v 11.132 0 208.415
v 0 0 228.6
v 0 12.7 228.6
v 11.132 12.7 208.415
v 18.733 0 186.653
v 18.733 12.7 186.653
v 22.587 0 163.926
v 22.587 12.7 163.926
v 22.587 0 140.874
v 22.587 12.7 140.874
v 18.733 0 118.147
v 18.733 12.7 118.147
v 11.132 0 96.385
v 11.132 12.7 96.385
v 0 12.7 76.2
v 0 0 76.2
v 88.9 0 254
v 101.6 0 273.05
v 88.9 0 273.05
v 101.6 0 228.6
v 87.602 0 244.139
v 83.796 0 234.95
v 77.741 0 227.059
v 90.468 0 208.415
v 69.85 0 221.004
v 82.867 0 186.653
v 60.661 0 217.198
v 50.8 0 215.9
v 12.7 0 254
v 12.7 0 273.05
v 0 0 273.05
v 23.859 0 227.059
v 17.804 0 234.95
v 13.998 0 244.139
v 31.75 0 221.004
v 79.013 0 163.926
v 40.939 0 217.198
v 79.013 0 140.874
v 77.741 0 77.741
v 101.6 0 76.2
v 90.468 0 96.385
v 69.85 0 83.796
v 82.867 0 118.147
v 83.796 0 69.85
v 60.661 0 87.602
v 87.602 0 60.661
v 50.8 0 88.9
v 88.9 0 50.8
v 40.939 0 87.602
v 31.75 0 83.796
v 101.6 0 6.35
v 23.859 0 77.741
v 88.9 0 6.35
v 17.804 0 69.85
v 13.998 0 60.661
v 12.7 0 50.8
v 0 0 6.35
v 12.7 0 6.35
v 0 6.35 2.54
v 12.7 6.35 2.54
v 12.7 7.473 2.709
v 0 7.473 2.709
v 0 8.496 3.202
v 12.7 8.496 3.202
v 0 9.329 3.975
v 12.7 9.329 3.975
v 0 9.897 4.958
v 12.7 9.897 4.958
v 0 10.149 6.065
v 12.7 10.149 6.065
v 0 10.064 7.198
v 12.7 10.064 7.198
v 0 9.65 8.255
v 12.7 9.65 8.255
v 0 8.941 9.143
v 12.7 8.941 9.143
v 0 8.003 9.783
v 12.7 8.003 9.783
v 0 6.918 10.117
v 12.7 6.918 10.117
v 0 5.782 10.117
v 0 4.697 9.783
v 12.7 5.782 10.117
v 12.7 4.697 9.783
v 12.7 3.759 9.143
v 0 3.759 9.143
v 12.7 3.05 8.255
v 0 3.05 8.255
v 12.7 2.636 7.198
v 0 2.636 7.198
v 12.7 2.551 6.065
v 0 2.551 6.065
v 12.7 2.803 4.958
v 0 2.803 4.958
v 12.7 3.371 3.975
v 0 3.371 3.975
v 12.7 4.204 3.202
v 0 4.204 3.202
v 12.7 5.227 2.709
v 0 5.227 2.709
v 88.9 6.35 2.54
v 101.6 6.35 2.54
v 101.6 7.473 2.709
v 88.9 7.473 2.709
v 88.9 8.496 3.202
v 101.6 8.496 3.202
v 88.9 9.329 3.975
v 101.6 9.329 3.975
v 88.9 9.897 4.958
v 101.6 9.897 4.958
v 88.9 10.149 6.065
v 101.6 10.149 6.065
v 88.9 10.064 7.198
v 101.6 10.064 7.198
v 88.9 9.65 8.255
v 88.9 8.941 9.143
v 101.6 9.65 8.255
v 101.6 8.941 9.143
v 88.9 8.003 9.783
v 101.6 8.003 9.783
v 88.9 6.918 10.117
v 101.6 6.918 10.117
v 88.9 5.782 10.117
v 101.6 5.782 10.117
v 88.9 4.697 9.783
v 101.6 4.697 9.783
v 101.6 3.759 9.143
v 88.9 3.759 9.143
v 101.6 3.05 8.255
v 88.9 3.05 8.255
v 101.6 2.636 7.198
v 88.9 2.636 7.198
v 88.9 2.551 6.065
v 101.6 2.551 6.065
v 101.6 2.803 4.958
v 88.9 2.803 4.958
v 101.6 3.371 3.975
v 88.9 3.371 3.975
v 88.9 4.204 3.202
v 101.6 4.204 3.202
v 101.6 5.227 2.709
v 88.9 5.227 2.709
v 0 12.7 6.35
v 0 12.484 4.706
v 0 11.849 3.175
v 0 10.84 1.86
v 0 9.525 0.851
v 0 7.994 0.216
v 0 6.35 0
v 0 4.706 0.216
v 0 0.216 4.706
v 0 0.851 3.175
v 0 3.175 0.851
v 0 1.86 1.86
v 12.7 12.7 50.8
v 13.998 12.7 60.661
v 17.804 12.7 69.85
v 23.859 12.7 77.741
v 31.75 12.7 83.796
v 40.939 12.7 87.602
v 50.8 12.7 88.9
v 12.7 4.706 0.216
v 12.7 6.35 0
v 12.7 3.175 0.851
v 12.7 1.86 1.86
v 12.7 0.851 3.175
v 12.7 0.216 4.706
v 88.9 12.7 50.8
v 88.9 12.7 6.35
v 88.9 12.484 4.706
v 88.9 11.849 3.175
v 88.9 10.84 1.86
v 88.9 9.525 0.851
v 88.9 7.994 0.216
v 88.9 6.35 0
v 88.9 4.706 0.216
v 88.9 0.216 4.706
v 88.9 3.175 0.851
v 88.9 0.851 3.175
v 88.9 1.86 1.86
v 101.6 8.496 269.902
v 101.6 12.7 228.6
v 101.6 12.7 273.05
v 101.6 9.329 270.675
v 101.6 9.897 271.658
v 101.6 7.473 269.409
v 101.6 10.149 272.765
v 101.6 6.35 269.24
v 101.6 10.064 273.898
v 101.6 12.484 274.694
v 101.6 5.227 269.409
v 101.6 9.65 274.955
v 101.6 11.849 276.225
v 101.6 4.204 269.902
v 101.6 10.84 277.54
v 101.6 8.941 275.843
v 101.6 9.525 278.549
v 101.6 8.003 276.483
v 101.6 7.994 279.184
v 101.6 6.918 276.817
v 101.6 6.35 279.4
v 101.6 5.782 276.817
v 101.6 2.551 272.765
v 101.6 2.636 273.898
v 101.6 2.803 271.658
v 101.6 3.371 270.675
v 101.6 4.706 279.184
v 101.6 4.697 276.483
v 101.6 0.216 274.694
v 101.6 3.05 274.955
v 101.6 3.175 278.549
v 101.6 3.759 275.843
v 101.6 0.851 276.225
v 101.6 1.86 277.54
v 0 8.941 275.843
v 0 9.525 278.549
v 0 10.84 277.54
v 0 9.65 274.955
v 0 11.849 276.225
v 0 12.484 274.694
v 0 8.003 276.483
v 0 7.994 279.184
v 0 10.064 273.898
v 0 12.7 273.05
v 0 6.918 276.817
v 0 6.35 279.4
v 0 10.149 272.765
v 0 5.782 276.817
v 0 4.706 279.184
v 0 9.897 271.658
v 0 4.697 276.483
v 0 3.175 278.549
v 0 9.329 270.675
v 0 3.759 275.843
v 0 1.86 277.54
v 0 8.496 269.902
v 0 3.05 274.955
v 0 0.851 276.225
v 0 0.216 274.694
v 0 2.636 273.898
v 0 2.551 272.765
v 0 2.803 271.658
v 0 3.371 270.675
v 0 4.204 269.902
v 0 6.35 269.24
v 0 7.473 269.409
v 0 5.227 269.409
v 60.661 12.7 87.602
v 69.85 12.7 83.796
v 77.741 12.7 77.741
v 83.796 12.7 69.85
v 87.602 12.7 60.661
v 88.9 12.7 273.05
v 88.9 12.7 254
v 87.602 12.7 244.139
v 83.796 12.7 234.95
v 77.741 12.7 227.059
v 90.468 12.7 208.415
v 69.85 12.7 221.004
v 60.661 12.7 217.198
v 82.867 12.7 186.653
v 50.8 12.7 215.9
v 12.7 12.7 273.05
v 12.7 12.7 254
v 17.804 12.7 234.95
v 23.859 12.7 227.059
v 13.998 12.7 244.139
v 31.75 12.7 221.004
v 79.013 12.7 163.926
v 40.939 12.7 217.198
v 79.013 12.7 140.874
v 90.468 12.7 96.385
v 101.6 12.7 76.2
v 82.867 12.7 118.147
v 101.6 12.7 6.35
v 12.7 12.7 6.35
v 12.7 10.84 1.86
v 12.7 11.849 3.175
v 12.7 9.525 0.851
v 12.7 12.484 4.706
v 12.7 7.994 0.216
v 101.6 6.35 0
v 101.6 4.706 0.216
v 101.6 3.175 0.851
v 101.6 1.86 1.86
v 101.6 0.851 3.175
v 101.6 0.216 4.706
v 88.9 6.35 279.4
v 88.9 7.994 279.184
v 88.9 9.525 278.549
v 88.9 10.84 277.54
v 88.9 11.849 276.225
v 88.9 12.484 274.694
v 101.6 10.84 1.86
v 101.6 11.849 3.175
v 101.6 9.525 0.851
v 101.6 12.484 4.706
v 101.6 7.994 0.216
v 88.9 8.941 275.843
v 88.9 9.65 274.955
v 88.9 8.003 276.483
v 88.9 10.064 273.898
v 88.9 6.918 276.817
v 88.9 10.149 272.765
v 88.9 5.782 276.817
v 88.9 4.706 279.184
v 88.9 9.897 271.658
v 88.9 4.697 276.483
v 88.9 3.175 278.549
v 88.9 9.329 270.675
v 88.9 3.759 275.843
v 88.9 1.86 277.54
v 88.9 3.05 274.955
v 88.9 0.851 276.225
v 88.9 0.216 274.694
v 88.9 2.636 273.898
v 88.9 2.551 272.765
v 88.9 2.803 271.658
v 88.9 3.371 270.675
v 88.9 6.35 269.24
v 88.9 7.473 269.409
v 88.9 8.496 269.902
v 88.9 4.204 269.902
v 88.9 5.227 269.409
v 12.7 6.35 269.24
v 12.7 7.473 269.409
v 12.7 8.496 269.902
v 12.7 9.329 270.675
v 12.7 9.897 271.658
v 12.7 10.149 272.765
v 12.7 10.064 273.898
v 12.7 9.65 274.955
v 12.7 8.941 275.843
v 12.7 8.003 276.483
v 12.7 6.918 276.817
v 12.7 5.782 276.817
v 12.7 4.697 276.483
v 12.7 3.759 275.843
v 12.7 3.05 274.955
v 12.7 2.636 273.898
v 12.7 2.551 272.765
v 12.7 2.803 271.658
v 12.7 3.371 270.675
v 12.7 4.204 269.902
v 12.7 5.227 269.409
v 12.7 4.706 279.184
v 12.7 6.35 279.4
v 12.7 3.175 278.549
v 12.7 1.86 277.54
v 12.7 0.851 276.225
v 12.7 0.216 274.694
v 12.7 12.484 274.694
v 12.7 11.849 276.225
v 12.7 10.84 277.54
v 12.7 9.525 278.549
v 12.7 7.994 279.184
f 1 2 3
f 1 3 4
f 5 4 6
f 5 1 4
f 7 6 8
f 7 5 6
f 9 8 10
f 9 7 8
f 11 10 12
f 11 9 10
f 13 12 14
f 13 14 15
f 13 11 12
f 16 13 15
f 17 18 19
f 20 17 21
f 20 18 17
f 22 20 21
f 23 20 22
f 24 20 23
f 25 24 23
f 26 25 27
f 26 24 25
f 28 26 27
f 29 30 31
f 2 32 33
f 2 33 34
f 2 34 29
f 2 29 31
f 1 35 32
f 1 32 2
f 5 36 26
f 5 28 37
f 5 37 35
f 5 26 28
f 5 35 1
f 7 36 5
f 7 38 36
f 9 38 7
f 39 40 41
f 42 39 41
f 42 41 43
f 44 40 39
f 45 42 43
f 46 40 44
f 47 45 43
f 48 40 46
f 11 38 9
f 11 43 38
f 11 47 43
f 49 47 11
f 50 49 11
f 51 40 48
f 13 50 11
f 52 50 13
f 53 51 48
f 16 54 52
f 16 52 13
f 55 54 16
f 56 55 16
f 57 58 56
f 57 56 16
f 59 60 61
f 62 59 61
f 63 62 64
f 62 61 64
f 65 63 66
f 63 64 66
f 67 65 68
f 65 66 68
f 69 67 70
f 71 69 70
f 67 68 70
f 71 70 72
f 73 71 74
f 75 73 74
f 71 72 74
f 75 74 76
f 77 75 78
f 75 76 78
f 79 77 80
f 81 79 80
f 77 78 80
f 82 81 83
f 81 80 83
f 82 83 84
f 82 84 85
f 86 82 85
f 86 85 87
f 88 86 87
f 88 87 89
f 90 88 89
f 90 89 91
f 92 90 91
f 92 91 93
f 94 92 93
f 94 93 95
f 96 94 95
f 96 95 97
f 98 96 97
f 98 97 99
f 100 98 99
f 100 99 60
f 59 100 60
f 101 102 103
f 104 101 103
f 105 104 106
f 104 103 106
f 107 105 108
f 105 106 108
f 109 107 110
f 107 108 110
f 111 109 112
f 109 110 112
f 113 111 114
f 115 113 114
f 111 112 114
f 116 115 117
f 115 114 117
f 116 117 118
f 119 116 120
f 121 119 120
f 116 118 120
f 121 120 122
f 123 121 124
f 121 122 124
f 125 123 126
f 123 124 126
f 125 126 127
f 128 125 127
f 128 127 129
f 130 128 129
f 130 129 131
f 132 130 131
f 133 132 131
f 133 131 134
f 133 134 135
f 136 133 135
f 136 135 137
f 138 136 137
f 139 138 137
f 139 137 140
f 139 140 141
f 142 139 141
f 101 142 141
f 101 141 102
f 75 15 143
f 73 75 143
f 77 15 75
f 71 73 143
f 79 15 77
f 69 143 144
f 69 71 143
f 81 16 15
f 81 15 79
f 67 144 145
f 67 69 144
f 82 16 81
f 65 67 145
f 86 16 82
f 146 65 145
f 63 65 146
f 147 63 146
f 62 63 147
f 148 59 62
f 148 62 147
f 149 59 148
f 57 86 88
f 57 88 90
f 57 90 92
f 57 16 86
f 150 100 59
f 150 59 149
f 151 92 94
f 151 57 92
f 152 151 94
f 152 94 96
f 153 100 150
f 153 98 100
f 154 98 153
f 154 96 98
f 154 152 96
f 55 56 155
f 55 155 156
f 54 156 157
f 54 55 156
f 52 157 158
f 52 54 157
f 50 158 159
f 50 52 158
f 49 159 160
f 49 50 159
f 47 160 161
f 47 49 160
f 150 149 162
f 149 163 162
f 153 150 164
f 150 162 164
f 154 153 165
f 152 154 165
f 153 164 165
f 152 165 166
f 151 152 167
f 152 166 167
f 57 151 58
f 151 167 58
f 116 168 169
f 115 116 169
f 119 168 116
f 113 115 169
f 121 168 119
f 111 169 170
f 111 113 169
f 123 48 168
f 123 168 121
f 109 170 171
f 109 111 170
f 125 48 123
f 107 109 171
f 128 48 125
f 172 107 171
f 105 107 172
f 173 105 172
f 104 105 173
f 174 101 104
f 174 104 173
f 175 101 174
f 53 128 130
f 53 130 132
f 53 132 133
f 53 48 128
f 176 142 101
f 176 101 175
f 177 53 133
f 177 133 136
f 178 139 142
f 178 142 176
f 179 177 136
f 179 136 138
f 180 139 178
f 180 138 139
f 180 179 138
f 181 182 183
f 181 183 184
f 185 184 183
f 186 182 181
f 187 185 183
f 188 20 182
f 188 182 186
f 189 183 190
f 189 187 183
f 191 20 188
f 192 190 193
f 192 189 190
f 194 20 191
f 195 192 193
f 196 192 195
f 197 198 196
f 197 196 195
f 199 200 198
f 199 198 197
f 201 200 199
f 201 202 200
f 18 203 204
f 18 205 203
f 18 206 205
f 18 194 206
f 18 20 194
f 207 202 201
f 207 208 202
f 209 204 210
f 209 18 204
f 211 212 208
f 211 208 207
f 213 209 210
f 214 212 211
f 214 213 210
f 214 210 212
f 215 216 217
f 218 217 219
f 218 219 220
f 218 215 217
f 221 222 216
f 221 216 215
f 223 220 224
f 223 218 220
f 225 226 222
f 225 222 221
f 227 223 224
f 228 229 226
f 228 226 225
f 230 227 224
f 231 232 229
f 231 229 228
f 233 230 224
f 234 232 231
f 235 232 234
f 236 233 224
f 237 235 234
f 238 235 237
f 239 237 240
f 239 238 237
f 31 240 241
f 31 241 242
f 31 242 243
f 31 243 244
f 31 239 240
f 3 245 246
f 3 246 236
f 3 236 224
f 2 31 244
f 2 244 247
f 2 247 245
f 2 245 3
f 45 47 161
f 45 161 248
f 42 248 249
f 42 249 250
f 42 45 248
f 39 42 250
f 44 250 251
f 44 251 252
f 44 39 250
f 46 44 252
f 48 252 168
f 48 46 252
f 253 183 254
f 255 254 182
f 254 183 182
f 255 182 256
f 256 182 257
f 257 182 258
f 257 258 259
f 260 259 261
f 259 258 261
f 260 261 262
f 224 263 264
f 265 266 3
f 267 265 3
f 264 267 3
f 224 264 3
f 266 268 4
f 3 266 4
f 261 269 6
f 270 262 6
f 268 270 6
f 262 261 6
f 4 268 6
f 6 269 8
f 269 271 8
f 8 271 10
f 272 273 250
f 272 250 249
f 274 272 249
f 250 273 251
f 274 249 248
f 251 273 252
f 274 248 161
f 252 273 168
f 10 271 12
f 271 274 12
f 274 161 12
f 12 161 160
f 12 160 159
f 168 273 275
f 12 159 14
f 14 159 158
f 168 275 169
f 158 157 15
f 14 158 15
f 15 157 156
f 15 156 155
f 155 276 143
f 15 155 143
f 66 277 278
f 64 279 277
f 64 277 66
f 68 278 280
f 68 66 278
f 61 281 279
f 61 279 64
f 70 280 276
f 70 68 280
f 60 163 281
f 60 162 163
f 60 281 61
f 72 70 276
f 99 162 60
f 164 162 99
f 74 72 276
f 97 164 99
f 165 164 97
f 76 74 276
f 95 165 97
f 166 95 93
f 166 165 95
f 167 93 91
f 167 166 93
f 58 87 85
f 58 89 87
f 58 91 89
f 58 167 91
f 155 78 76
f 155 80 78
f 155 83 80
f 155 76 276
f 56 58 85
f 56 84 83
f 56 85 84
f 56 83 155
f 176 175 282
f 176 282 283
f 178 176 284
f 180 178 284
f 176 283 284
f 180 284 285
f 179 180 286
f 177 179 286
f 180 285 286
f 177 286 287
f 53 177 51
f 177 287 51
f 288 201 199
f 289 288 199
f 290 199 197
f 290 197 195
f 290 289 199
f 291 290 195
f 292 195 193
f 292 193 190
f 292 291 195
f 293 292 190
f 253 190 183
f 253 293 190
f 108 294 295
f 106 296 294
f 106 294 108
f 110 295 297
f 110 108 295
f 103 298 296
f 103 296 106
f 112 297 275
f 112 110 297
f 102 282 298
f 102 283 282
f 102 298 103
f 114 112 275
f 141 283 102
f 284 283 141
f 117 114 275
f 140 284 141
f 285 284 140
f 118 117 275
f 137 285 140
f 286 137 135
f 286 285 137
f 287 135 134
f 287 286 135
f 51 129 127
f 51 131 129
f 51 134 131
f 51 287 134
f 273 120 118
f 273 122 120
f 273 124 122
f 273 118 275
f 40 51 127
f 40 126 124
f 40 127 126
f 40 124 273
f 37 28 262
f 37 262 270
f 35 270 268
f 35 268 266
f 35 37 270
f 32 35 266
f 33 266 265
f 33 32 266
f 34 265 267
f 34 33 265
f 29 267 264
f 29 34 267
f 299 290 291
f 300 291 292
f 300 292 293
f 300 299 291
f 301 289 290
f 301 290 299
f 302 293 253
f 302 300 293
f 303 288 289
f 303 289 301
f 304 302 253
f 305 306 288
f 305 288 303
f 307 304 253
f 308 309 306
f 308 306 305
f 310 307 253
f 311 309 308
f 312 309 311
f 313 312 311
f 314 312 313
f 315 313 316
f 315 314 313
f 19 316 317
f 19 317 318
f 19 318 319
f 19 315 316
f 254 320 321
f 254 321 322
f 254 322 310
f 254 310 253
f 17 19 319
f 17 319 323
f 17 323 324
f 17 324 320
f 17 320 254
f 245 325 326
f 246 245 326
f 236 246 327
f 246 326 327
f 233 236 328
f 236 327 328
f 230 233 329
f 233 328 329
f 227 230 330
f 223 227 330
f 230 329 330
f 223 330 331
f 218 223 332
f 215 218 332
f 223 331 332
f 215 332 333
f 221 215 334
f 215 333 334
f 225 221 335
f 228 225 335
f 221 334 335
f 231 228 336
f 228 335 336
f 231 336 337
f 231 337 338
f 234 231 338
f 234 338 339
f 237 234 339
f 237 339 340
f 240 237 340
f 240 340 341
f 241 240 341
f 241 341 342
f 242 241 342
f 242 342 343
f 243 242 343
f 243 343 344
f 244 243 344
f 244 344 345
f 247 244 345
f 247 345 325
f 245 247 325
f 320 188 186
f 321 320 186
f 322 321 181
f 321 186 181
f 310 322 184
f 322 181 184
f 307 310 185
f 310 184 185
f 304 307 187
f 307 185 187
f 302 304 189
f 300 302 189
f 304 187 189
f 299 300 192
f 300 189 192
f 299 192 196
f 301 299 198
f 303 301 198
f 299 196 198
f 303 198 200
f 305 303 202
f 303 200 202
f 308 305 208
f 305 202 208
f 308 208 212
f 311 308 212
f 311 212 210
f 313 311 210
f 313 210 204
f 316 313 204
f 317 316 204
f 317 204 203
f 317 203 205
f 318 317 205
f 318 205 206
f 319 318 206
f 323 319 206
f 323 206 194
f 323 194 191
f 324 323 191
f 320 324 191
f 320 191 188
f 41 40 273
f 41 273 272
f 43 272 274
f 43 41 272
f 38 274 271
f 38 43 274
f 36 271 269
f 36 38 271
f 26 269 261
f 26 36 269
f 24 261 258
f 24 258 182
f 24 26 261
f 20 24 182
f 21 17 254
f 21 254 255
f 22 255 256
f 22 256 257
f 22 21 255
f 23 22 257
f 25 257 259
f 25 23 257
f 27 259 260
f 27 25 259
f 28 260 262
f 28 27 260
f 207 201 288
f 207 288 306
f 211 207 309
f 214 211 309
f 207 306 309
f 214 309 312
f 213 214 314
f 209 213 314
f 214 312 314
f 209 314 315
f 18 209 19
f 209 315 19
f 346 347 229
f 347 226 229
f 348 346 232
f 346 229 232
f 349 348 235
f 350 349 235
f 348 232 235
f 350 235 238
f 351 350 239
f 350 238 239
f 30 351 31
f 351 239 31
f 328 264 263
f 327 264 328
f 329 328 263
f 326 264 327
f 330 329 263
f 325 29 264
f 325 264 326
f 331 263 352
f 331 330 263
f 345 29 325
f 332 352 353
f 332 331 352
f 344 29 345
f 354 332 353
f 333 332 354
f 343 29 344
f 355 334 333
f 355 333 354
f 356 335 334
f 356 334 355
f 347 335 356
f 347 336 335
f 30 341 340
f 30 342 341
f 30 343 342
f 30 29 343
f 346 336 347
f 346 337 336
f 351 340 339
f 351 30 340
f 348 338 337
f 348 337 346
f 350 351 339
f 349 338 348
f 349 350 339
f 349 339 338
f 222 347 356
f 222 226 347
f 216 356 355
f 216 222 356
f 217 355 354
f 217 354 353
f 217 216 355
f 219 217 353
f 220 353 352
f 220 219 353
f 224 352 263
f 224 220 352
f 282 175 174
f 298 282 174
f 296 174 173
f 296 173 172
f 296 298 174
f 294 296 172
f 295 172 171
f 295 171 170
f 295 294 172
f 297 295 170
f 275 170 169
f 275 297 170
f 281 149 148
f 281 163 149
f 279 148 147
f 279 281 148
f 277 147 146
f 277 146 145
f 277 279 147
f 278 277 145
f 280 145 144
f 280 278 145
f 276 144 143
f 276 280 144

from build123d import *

# Parameters (mm, degrees)
BOSS_EXTRUDE1_DEPTH = 12.7
FILLET1_R           = 6.35
SKETCH2_R           = 3.81
CUT_EXTRUDE1_DEPTH  = 298.570512652
SKETCH3_R           = 3.81
CUT_EXTRUDE2_DEPTH  = 298.570512652


with BuildPart() as part:
    # Sketch1 → Boss-Extrude1 (new body)
    with BuildSketch(Plane(origin=(0, 0, 0), x_dir=(1, 0, 0), z_dir=(0, 1, 0))):
        with BuildLine():
            Line((0, 0), (12.7, 0))
            Line((12.7, 0), (12.7, -50.8))
            ThreePointArc((12.7, -50.8), (23.859231637, -77.740768363), (50.8, -88.9))
            ThreePointArc((50.8, -88.9), (77.740768363, -77.740768363), (88.9, -50.8))
            Line((88.9, -50.8), (88.9, 0))
            Line((88.9, 0), (101.6, 0))
            Line((101.6, 0), (101.6, -76.2))
            ThreePointArc((101.6, -76.2), (78.528496405, -152.4), (101.6, -228.6))
            Line((101.6, -228.6), (101.6, -279.4))
            Line((101.6, -279.4), (88.9, -279.4))
            Line((88.9, -279.4), (88.9, -254))
            ThreePointArc((88.9, -254), (77.740768363, -227.059231637), (50.8, -215.9))
            ThreePointArc((50.8, -215.9), (23.859231637, -227.059231637), (12.7, -254))
            Line((12.7, -254), (12.7, -279.4))
            Line((12.7, -279.4), (0, -279.4))
            Line((0, -279.4), (0, -228.6))
            ThreePointArc((0, -228.6), (23.071503595, -152.4), (0, -76.2))
            Line((0, -76.2), (0, 0))
        make_face()
    extrude(amount=BOSS_EXTRUDE1_DEPTH)

    # Fillet1
    fillet1_edges = [part.edges().sort_by_distance(p)[0] for p in [
        (95.25, 0, 0),
        (6.35, 0, 0),
        (95.25, 12.7, 0),
        (6.35, 12.7, 0),
        (6.35, 0, 279.4),
        (6.35, 12.7, 279.4),
        (95.25, 0, 279.4),
        (95.25, 12.7, 279.4),
    ]]
    fillet(fillet1_edges, radius=FILLET1_R - 0.0001)  # a hair under: the kernel refuses the full size

    # Sketch2 → Cut-Extrude1 (cut, through all)
    with BuildSketch(Plane(origin=(101.6, 0, 0), x_dir=(0, 0, -1), z_dir=(1, 0, 0))):
        with Locations((-273.05, 6.35)):
            Circle(SKETCH2_R)
    extrude(amount=-CUT_EXTRUDE1_DEPTH, mode=Mode.SUBTRACT)

    # Sketch3 → Cut-Extrude2 (cut, through all)
    with BuildSketch(Plane(origin=(101.6, 0, 0), x_dir=(0, 0, -1), z_dir=(1, 0, 0))):
        with Locations((-6.35, 6.35)):
            Circle(SKETCH3_R)
    extrude(amount=-CUT_EXTRUDE2_DEPTH, mode=Mode.SUBTRACT)


solid = part.part
